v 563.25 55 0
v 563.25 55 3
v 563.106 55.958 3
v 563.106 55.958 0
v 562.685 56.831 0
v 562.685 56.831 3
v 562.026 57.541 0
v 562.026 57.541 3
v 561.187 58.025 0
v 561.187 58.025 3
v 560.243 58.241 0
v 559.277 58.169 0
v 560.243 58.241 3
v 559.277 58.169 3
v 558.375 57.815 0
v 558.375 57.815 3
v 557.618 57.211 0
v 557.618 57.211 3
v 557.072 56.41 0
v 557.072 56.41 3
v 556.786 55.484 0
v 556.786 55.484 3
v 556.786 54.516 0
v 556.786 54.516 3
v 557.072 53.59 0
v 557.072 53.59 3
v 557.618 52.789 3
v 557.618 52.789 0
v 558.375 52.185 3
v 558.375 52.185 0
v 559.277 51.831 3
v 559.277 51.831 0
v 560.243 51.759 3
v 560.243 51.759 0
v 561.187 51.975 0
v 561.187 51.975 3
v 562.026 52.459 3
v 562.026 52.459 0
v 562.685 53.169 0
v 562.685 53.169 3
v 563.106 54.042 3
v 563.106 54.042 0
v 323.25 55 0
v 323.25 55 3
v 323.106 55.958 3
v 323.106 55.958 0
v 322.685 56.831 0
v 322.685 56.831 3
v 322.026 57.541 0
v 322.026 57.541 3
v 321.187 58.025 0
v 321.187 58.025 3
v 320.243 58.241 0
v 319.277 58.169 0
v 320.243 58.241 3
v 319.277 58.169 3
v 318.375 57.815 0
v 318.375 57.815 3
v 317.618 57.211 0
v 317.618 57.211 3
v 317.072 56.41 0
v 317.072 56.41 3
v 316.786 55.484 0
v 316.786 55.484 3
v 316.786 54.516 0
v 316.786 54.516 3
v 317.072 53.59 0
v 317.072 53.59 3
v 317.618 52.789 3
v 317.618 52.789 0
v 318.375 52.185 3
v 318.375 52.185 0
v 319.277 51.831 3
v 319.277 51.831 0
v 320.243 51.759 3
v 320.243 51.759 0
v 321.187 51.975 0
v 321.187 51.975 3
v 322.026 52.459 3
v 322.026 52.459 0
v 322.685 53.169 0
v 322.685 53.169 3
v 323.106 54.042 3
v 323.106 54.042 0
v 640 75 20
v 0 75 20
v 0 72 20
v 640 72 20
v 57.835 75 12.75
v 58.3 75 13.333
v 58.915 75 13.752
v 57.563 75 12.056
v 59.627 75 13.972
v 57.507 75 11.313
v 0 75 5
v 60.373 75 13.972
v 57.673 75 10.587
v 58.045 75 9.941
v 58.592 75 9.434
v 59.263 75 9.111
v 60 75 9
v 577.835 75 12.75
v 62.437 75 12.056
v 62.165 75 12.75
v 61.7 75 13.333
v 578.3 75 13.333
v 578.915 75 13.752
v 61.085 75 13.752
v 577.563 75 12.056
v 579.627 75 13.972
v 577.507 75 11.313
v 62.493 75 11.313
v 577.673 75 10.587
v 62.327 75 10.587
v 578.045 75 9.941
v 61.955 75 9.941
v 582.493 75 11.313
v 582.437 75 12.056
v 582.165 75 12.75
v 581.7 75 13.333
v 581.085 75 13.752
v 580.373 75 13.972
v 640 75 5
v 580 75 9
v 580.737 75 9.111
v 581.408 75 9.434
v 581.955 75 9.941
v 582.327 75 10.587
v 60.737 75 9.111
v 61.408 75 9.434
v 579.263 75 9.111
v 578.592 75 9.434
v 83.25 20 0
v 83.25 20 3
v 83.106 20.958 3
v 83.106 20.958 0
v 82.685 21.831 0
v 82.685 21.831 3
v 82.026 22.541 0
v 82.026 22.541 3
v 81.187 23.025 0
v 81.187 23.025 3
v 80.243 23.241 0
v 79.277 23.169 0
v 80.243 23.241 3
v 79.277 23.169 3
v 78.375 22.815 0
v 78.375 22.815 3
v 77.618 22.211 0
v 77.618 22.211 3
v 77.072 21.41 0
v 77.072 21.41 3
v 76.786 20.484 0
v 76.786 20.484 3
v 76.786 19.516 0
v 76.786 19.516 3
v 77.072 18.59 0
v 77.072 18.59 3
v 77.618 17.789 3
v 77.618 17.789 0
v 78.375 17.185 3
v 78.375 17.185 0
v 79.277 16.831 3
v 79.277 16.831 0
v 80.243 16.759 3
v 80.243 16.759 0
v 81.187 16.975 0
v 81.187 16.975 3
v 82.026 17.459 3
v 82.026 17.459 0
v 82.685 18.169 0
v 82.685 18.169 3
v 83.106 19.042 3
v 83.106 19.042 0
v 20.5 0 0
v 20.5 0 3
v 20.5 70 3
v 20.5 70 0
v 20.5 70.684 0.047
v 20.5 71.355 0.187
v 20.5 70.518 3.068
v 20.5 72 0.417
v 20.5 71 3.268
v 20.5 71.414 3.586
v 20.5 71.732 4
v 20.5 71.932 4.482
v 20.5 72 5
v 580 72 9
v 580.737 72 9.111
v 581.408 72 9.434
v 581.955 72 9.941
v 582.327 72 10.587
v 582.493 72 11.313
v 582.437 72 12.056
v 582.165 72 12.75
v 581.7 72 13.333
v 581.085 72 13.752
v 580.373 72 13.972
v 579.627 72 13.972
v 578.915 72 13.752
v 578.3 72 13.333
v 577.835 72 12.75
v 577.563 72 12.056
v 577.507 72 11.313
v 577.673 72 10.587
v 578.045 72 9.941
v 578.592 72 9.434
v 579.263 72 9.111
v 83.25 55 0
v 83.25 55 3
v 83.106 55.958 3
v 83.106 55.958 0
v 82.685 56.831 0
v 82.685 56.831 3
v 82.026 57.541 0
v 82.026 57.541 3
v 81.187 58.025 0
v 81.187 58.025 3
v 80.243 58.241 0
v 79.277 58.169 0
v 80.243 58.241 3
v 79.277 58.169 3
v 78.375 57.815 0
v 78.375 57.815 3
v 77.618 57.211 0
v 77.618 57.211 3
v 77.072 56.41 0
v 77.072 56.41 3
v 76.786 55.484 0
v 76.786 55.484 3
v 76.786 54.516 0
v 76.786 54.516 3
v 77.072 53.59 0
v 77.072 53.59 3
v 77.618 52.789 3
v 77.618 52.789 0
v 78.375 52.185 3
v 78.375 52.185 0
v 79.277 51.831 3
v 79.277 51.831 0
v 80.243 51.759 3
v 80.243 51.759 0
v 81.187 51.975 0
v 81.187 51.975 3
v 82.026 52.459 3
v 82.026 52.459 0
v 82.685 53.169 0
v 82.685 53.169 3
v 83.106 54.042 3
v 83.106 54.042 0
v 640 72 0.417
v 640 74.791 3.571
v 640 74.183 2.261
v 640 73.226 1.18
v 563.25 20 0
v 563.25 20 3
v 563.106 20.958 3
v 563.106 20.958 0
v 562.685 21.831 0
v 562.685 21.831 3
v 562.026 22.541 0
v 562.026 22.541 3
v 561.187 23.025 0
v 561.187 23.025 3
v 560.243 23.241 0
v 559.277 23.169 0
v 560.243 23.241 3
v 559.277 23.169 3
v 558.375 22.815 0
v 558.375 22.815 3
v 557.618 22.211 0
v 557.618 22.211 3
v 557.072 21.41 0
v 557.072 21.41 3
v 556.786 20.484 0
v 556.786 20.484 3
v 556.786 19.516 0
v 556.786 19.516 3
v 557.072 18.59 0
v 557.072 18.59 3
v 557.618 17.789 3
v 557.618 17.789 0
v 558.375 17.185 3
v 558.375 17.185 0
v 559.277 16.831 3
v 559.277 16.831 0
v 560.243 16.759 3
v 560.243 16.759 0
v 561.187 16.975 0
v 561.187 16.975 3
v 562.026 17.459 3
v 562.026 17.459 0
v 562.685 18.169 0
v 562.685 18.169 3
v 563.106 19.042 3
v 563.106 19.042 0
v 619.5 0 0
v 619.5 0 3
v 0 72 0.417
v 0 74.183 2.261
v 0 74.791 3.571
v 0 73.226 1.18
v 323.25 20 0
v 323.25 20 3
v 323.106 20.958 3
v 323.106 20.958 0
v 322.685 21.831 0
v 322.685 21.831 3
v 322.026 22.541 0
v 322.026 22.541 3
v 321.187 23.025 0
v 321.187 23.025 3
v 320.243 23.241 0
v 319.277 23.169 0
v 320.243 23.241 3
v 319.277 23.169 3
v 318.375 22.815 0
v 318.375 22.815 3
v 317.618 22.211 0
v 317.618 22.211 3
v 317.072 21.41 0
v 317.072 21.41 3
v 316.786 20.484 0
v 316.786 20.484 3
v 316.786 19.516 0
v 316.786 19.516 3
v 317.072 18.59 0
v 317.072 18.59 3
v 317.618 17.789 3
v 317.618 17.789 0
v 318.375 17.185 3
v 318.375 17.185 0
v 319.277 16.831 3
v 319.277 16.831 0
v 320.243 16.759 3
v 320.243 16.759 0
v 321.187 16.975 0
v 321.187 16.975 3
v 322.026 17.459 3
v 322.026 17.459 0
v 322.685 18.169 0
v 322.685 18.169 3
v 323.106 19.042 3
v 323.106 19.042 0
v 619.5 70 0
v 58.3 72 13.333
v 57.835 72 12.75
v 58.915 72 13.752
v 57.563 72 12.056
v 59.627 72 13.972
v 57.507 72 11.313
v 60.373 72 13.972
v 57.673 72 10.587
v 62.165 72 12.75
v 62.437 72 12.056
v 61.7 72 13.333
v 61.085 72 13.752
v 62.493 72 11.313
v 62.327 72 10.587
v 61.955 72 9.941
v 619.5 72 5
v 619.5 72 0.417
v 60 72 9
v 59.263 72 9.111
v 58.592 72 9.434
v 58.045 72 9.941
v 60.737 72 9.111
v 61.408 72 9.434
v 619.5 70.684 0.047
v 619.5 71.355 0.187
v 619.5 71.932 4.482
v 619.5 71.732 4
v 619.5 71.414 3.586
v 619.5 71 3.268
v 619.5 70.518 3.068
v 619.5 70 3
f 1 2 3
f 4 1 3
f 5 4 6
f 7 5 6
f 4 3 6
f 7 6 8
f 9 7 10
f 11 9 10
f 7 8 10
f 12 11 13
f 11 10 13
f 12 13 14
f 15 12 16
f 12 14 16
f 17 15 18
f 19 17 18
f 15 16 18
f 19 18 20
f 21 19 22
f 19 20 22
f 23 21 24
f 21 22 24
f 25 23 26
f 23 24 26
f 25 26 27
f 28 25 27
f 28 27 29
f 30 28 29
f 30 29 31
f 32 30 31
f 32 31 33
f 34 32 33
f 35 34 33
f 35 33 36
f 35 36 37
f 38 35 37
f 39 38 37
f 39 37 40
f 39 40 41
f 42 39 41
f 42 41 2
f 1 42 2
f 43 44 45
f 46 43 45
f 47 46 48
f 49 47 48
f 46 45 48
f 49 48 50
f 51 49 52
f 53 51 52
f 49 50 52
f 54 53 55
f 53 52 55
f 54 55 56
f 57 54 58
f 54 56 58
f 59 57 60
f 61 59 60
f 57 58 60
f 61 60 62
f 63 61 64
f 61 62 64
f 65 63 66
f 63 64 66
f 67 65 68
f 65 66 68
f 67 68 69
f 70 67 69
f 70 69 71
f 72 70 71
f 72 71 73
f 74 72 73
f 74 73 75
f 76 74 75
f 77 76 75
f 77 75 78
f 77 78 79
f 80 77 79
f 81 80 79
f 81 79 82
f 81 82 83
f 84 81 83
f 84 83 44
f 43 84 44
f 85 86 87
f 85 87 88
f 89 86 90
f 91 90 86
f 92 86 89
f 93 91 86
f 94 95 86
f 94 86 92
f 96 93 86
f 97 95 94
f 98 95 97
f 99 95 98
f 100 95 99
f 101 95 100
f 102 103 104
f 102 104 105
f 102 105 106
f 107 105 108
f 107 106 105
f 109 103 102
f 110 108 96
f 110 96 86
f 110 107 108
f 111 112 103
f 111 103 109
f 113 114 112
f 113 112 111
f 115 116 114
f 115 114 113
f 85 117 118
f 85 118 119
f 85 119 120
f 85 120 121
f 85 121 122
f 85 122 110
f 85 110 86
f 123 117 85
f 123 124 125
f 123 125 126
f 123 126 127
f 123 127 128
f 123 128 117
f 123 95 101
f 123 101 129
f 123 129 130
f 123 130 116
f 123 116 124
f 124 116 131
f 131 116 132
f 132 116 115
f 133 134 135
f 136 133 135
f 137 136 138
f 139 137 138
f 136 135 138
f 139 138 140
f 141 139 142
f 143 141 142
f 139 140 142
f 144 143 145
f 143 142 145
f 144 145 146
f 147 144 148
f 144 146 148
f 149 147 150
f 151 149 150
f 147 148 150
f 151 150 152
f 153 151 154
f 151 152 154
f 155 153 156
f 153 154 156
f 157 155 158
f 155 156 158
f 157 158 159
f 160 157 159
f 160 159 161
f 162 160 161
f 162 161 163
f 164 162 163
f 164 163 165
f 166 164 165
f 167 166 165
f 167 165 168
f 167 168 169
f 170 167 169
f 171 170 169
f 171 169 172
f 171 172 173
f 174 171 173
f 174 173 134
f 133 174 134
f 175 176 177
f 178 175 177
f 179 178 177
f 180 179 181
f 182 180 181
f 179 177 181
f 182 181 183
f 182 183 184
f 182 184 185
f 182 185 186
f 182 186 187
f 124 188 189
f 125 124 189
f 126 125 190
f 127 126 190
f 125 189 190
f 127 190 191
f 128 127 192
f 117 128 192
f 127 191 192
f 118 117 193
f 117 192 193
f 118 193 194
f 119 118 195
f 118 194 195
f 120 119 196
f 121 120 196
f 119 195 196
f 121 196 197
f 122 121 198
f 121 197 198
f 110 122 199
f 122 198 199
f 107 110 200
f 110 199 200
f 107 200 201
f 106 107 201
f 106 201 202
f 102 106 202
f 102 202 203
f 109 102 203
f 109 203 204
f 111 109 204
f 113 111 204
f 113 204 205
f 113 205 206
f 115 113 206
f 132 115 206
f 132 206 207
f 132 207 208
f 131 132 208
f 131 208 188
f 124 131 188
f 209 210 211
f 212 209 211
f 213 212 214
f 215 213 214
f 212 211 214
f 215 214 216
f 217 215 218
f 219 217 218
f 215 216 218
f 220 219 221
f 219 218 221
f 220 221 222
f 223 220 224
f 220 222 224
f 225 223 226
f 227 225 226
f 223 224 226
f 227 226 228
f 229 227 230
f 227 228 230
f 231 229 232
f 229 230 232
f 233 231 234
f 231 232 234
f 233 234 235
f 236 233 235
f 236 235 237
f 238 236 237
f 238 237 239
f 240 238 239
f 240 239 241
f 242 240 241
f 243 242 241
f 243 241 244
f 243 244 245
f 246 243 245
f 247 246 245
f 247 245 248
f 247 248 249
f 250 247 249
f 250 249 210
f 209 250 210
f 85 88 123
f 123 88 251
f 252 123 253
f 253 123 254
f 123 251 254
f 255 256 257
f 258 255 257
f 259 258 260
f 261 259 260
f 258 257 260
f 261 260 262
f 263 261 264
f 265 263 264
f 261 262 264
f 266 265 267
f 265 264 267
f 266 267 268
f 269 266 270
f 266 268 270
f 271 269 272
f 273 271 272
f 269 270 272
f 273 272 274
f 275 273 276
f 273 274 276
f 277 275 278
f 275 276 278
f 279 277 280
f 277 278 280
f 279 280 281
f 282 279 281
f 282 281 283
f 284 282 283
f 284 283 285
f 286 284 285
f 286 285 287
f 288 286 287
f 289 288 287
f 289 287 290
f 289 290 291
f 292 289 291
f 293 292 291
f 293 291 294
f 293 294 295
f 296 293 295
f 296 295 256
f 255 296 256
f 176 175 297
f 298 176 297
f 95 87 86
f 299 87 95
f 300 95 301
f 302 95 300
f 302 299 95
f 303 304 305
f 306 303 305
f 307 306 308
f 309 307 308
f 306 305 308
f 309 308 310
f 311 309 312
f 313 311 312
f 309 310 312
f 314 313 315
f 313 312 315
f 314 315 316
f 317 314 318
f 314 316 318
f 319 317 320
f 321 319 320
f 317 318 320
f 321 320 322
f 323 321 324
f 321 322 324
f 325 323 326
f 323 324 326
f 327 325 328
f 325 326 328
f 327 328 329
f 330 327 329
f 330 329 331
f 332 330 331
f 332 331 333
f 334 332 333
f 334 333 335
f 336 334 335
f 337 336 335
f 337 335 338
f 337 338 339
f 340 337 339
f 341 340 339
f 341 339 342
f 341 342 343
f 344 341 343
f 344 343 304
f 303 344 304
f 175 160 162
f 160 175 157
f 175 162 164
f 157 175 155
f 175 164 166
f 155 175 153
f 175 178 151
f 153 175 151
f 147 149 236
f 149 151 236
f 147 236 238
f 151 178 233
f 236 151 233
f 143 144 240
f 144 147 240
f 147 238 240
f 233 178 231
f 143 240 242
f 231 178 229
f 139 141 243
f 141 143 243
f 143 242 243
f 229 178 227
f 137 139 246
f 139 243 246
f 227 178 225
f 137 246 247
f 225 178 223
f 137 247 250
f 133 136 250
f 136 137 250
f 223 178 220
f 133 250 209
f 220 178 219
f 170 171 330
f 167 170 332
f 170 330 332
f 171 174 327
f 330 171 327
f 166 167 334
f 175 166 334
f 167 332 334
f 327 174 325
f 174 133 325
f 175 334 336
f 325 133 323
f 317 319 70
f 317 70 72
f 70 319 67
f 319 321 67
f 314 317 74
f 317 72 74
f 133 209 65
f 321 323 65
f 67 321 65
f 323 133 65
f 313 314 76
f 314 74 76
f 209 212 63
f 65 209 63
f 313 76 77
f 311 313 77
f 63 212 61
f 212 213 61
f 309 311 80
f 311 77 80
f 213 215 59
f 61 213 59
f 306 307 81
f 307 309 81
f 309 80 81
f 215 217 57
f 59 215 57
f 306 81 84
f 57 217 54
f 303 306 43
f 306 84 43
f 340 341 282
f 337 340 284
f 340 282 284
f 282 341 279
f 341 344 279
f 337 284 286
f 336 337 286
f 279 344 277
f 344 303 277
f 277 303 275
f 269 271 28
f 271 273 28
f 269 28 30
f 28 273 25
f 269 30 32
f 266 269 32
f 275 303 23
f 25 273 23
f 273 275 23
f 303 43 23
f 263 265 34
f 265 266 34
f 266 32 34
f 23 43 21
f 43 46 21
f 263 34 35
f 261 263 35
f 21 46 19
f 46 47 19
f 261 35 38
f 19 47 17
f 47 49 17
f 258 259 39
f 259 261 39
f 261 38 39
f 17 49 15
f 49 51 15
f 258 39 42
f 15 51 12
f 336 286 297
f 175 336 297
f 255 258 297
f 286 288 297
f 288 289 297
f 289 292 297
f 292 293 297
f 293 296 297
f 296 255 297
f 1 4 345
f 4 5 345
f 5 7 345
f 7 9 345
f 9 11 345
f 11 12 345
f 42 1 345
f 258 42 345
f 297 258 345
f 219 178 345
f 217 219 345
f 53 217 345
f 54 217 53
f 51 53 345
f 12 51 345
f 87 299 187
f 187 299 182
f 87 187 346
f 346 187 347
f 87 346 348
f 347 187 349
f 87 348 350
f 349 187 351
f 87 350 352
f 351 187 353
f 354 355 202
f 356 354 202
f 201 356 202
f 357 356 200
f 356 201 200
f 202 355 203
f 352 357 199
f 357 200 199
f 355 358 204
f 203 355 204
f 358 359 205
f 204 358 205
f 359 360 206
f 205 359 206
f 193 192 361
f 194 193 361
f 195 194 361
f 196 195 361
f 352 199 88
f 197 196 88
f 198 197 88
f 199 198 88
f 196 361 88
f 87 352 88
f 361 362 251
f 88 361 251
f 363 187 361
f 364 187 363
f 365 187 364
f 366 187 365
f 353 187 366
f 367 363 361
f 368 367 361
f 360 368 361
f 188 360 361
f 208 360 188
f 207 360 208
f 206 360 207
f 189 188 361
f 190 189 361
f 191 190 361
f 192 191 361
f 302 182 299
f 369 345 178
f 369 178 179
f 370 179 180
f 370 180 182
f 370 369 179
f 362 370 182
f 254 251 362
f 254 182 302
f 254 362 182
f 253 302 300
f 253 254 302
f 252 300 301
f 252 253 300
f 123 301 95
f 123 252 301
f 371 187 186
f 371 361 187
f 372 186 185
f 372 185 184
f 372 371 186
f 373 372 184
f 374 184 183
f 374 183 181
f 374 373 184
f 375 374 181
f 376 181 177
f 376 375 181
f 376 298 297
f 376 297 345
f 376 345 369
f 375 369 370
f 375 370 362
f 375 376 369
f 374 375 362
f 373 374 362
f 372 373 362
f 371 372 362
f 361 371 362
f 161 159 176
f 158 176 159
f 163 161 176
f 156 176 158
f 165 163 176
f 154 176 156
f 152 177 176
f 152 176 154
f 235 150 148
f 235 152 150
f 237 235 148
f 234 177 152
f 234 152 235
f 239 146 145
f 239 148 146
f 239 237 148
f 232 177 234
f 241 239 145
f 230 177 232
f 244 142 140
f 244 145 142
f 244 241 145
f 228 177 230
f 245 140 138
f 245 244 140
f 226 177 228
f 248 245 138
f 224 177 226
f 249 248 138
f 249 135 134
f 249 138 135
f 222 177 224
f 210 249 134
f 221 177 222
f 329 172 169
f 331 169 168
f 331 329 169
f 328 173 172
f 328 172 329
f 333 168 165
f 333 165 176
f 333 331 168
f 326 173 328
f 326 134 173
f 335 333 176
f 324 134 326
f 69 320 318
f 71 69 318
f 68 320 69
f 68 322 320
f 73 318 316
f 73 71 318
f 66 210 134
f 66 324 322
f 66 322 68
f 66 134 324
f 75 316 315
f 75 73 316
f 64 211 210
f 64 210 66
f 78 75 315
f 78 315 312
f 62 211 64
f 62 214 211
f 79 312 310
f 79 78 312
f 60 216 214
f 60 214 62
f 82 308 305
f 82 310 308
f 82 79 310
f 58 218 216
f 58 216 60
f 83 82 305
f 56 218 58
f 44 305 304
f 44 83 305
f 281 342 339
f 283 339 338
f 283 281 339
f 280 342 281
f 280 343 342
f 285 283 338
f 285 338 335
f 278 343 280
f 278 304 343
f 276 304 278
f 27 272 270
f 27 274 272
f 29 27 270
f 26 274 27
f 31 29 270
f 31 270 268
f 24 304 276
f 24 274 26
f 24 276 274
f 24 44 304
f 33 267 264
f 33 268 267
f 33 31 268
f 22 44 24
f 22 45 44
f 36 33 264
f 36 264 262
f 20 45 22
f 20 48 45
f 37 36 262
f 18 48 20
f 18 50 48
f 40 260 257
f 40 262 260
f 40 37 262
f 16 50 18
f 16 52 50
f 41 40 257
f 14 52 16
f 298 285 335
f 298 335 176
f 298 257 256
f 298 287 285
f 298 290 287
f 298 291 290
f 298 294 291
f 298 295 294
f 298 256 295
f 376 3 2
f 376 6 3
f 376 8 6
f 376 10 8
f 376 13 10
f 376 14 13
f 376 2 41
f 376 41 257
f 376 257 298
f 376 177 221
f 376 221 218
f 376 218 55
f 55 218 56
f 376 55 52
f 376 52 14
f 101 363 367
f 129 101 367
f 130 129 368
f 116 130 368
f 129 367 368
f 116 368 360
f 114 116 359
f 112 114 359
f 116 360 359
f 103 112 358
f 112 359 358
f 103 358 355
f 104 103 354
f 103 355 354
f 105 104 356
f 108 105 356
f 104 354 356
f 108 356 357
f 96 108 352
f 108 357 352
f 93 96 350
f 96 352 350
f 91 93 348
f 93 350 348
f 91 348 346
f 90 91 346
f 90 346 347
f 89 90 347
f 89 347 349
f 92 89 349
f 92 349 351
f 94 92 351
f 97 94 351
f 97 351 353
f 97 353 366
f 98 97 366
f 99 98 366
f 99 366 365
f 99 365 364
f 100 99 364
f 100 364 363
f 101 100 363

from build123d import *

# Parameters (mm, degrees)
SKETCH_1_W          = 640
SKETCH_1_H          = 75
EXTRUDE_1_DEPTH     = 3
SKETCH_2_W          = 640
SKETCH_2_H          = 3
EXTRUDE_2_DEPTH     = 17
FILLET_1_R          = 5
SKETCH_5_R          = 2.5
CUT_EXTRUDE_3_DEPTH = 645.347732207
SKETCH_3_R          = 3.25
CUT_EXTRUDE_1_DEPTH = 645.603754255
SKETCH_4_W          = 20.5
SKETCH_4_H          = 72
CUT_EXTRUDE_2_DEPTH = 645.603754255
FILLET_3_R          = 2


with BuildPart() as part:
    # 스케치1 → 보스-돌출1 (new body)
    with BuildSketch(Plane.XY):
        with Locations((320, 37.5)):
            Rectangle(SKETCH_1_W, SKETCH_1_H)
    extrude(amount=EXTRUDE_1_DEPTH)

    # 스케치2 → 보스-돌출2 (add)
    with BuildSketch(Plane.XY.offset(3)):
        with Locations((320, 73.5)):
            Rectangle(SKETCH_2_W, SKETCH_2_H)
    extrude(amount=EXTRUDE_2_DEPTH)

    # 필렛1
    fillet_1_edges = [part.edges().sort_by_distance(p)[0] for p in [
        (320, 75, 0),
    ]]
    fillet(fillet_1_edges, radius=FILLET_1_R)

    # 스케치5 → 컷-돌출3 (cut, through all)
    with BuildSketch(Plane.XZ.offset(-72)):
        with Locations(Location((60, 11.5, 0), (0, 0, 270))):
            Circle(SKETCH_5_R)
        with Locations(Location((580, 11.5, 0), (0, 0, 270))):
            Circle(SKETCH_5_R)
    extrude(amount=-CUT_EXTRUDE_3_DEPTH, mode=Mode.SUBTRACT)

    # 스케치3 → 컷-돌출1 (cut, through all)
    with BuildSketch(Plane.XY.offset(3)):
        with Locations((80, 55)):
            Circle(SKETCH_3_R)
        with Locations((80, 20)):
            Circle(SKETCH_3_R)
        with Locations((320, 55)):
            Circle(SKETCH_3_R)
        with Locations((320, 20)):
            Circle(SKETCH_3_R)
        with Locations((560, 55)):
            Circle(SKETCH_3_R)
        with Locations((560, 20)):
            Circle(SKETCH_3_R)
    extrude(amount=-CUT_EXTRUDE_1_DEPTH, mode=Mode.SUBTRACT)

    # 스케치4 → 컷-돌출2 (cut, through all)
    with BuildSketch(Plane.XY.offset(3)):
        with Locations((10.25, 36)):
            Rectangle(SKETCH_4_W, SKETCH_4_H)
        with Locations((629.75, 36)):
            Rectangle(SKETCH_4_W, SKETCH_4_H)
    extrude(amount=-CUT_EXTRUDE_2_DEPTH, mode=Mode.SUBTRACT)

    # 필렛3
    fillet_3_edges = [part.edges().sort_by_distance(p)[0] for p in [
        (320, 72, 3),
    ]]
    fillet(fillet_3_edges, radius=FILLET_3_R)


solid = part.part
